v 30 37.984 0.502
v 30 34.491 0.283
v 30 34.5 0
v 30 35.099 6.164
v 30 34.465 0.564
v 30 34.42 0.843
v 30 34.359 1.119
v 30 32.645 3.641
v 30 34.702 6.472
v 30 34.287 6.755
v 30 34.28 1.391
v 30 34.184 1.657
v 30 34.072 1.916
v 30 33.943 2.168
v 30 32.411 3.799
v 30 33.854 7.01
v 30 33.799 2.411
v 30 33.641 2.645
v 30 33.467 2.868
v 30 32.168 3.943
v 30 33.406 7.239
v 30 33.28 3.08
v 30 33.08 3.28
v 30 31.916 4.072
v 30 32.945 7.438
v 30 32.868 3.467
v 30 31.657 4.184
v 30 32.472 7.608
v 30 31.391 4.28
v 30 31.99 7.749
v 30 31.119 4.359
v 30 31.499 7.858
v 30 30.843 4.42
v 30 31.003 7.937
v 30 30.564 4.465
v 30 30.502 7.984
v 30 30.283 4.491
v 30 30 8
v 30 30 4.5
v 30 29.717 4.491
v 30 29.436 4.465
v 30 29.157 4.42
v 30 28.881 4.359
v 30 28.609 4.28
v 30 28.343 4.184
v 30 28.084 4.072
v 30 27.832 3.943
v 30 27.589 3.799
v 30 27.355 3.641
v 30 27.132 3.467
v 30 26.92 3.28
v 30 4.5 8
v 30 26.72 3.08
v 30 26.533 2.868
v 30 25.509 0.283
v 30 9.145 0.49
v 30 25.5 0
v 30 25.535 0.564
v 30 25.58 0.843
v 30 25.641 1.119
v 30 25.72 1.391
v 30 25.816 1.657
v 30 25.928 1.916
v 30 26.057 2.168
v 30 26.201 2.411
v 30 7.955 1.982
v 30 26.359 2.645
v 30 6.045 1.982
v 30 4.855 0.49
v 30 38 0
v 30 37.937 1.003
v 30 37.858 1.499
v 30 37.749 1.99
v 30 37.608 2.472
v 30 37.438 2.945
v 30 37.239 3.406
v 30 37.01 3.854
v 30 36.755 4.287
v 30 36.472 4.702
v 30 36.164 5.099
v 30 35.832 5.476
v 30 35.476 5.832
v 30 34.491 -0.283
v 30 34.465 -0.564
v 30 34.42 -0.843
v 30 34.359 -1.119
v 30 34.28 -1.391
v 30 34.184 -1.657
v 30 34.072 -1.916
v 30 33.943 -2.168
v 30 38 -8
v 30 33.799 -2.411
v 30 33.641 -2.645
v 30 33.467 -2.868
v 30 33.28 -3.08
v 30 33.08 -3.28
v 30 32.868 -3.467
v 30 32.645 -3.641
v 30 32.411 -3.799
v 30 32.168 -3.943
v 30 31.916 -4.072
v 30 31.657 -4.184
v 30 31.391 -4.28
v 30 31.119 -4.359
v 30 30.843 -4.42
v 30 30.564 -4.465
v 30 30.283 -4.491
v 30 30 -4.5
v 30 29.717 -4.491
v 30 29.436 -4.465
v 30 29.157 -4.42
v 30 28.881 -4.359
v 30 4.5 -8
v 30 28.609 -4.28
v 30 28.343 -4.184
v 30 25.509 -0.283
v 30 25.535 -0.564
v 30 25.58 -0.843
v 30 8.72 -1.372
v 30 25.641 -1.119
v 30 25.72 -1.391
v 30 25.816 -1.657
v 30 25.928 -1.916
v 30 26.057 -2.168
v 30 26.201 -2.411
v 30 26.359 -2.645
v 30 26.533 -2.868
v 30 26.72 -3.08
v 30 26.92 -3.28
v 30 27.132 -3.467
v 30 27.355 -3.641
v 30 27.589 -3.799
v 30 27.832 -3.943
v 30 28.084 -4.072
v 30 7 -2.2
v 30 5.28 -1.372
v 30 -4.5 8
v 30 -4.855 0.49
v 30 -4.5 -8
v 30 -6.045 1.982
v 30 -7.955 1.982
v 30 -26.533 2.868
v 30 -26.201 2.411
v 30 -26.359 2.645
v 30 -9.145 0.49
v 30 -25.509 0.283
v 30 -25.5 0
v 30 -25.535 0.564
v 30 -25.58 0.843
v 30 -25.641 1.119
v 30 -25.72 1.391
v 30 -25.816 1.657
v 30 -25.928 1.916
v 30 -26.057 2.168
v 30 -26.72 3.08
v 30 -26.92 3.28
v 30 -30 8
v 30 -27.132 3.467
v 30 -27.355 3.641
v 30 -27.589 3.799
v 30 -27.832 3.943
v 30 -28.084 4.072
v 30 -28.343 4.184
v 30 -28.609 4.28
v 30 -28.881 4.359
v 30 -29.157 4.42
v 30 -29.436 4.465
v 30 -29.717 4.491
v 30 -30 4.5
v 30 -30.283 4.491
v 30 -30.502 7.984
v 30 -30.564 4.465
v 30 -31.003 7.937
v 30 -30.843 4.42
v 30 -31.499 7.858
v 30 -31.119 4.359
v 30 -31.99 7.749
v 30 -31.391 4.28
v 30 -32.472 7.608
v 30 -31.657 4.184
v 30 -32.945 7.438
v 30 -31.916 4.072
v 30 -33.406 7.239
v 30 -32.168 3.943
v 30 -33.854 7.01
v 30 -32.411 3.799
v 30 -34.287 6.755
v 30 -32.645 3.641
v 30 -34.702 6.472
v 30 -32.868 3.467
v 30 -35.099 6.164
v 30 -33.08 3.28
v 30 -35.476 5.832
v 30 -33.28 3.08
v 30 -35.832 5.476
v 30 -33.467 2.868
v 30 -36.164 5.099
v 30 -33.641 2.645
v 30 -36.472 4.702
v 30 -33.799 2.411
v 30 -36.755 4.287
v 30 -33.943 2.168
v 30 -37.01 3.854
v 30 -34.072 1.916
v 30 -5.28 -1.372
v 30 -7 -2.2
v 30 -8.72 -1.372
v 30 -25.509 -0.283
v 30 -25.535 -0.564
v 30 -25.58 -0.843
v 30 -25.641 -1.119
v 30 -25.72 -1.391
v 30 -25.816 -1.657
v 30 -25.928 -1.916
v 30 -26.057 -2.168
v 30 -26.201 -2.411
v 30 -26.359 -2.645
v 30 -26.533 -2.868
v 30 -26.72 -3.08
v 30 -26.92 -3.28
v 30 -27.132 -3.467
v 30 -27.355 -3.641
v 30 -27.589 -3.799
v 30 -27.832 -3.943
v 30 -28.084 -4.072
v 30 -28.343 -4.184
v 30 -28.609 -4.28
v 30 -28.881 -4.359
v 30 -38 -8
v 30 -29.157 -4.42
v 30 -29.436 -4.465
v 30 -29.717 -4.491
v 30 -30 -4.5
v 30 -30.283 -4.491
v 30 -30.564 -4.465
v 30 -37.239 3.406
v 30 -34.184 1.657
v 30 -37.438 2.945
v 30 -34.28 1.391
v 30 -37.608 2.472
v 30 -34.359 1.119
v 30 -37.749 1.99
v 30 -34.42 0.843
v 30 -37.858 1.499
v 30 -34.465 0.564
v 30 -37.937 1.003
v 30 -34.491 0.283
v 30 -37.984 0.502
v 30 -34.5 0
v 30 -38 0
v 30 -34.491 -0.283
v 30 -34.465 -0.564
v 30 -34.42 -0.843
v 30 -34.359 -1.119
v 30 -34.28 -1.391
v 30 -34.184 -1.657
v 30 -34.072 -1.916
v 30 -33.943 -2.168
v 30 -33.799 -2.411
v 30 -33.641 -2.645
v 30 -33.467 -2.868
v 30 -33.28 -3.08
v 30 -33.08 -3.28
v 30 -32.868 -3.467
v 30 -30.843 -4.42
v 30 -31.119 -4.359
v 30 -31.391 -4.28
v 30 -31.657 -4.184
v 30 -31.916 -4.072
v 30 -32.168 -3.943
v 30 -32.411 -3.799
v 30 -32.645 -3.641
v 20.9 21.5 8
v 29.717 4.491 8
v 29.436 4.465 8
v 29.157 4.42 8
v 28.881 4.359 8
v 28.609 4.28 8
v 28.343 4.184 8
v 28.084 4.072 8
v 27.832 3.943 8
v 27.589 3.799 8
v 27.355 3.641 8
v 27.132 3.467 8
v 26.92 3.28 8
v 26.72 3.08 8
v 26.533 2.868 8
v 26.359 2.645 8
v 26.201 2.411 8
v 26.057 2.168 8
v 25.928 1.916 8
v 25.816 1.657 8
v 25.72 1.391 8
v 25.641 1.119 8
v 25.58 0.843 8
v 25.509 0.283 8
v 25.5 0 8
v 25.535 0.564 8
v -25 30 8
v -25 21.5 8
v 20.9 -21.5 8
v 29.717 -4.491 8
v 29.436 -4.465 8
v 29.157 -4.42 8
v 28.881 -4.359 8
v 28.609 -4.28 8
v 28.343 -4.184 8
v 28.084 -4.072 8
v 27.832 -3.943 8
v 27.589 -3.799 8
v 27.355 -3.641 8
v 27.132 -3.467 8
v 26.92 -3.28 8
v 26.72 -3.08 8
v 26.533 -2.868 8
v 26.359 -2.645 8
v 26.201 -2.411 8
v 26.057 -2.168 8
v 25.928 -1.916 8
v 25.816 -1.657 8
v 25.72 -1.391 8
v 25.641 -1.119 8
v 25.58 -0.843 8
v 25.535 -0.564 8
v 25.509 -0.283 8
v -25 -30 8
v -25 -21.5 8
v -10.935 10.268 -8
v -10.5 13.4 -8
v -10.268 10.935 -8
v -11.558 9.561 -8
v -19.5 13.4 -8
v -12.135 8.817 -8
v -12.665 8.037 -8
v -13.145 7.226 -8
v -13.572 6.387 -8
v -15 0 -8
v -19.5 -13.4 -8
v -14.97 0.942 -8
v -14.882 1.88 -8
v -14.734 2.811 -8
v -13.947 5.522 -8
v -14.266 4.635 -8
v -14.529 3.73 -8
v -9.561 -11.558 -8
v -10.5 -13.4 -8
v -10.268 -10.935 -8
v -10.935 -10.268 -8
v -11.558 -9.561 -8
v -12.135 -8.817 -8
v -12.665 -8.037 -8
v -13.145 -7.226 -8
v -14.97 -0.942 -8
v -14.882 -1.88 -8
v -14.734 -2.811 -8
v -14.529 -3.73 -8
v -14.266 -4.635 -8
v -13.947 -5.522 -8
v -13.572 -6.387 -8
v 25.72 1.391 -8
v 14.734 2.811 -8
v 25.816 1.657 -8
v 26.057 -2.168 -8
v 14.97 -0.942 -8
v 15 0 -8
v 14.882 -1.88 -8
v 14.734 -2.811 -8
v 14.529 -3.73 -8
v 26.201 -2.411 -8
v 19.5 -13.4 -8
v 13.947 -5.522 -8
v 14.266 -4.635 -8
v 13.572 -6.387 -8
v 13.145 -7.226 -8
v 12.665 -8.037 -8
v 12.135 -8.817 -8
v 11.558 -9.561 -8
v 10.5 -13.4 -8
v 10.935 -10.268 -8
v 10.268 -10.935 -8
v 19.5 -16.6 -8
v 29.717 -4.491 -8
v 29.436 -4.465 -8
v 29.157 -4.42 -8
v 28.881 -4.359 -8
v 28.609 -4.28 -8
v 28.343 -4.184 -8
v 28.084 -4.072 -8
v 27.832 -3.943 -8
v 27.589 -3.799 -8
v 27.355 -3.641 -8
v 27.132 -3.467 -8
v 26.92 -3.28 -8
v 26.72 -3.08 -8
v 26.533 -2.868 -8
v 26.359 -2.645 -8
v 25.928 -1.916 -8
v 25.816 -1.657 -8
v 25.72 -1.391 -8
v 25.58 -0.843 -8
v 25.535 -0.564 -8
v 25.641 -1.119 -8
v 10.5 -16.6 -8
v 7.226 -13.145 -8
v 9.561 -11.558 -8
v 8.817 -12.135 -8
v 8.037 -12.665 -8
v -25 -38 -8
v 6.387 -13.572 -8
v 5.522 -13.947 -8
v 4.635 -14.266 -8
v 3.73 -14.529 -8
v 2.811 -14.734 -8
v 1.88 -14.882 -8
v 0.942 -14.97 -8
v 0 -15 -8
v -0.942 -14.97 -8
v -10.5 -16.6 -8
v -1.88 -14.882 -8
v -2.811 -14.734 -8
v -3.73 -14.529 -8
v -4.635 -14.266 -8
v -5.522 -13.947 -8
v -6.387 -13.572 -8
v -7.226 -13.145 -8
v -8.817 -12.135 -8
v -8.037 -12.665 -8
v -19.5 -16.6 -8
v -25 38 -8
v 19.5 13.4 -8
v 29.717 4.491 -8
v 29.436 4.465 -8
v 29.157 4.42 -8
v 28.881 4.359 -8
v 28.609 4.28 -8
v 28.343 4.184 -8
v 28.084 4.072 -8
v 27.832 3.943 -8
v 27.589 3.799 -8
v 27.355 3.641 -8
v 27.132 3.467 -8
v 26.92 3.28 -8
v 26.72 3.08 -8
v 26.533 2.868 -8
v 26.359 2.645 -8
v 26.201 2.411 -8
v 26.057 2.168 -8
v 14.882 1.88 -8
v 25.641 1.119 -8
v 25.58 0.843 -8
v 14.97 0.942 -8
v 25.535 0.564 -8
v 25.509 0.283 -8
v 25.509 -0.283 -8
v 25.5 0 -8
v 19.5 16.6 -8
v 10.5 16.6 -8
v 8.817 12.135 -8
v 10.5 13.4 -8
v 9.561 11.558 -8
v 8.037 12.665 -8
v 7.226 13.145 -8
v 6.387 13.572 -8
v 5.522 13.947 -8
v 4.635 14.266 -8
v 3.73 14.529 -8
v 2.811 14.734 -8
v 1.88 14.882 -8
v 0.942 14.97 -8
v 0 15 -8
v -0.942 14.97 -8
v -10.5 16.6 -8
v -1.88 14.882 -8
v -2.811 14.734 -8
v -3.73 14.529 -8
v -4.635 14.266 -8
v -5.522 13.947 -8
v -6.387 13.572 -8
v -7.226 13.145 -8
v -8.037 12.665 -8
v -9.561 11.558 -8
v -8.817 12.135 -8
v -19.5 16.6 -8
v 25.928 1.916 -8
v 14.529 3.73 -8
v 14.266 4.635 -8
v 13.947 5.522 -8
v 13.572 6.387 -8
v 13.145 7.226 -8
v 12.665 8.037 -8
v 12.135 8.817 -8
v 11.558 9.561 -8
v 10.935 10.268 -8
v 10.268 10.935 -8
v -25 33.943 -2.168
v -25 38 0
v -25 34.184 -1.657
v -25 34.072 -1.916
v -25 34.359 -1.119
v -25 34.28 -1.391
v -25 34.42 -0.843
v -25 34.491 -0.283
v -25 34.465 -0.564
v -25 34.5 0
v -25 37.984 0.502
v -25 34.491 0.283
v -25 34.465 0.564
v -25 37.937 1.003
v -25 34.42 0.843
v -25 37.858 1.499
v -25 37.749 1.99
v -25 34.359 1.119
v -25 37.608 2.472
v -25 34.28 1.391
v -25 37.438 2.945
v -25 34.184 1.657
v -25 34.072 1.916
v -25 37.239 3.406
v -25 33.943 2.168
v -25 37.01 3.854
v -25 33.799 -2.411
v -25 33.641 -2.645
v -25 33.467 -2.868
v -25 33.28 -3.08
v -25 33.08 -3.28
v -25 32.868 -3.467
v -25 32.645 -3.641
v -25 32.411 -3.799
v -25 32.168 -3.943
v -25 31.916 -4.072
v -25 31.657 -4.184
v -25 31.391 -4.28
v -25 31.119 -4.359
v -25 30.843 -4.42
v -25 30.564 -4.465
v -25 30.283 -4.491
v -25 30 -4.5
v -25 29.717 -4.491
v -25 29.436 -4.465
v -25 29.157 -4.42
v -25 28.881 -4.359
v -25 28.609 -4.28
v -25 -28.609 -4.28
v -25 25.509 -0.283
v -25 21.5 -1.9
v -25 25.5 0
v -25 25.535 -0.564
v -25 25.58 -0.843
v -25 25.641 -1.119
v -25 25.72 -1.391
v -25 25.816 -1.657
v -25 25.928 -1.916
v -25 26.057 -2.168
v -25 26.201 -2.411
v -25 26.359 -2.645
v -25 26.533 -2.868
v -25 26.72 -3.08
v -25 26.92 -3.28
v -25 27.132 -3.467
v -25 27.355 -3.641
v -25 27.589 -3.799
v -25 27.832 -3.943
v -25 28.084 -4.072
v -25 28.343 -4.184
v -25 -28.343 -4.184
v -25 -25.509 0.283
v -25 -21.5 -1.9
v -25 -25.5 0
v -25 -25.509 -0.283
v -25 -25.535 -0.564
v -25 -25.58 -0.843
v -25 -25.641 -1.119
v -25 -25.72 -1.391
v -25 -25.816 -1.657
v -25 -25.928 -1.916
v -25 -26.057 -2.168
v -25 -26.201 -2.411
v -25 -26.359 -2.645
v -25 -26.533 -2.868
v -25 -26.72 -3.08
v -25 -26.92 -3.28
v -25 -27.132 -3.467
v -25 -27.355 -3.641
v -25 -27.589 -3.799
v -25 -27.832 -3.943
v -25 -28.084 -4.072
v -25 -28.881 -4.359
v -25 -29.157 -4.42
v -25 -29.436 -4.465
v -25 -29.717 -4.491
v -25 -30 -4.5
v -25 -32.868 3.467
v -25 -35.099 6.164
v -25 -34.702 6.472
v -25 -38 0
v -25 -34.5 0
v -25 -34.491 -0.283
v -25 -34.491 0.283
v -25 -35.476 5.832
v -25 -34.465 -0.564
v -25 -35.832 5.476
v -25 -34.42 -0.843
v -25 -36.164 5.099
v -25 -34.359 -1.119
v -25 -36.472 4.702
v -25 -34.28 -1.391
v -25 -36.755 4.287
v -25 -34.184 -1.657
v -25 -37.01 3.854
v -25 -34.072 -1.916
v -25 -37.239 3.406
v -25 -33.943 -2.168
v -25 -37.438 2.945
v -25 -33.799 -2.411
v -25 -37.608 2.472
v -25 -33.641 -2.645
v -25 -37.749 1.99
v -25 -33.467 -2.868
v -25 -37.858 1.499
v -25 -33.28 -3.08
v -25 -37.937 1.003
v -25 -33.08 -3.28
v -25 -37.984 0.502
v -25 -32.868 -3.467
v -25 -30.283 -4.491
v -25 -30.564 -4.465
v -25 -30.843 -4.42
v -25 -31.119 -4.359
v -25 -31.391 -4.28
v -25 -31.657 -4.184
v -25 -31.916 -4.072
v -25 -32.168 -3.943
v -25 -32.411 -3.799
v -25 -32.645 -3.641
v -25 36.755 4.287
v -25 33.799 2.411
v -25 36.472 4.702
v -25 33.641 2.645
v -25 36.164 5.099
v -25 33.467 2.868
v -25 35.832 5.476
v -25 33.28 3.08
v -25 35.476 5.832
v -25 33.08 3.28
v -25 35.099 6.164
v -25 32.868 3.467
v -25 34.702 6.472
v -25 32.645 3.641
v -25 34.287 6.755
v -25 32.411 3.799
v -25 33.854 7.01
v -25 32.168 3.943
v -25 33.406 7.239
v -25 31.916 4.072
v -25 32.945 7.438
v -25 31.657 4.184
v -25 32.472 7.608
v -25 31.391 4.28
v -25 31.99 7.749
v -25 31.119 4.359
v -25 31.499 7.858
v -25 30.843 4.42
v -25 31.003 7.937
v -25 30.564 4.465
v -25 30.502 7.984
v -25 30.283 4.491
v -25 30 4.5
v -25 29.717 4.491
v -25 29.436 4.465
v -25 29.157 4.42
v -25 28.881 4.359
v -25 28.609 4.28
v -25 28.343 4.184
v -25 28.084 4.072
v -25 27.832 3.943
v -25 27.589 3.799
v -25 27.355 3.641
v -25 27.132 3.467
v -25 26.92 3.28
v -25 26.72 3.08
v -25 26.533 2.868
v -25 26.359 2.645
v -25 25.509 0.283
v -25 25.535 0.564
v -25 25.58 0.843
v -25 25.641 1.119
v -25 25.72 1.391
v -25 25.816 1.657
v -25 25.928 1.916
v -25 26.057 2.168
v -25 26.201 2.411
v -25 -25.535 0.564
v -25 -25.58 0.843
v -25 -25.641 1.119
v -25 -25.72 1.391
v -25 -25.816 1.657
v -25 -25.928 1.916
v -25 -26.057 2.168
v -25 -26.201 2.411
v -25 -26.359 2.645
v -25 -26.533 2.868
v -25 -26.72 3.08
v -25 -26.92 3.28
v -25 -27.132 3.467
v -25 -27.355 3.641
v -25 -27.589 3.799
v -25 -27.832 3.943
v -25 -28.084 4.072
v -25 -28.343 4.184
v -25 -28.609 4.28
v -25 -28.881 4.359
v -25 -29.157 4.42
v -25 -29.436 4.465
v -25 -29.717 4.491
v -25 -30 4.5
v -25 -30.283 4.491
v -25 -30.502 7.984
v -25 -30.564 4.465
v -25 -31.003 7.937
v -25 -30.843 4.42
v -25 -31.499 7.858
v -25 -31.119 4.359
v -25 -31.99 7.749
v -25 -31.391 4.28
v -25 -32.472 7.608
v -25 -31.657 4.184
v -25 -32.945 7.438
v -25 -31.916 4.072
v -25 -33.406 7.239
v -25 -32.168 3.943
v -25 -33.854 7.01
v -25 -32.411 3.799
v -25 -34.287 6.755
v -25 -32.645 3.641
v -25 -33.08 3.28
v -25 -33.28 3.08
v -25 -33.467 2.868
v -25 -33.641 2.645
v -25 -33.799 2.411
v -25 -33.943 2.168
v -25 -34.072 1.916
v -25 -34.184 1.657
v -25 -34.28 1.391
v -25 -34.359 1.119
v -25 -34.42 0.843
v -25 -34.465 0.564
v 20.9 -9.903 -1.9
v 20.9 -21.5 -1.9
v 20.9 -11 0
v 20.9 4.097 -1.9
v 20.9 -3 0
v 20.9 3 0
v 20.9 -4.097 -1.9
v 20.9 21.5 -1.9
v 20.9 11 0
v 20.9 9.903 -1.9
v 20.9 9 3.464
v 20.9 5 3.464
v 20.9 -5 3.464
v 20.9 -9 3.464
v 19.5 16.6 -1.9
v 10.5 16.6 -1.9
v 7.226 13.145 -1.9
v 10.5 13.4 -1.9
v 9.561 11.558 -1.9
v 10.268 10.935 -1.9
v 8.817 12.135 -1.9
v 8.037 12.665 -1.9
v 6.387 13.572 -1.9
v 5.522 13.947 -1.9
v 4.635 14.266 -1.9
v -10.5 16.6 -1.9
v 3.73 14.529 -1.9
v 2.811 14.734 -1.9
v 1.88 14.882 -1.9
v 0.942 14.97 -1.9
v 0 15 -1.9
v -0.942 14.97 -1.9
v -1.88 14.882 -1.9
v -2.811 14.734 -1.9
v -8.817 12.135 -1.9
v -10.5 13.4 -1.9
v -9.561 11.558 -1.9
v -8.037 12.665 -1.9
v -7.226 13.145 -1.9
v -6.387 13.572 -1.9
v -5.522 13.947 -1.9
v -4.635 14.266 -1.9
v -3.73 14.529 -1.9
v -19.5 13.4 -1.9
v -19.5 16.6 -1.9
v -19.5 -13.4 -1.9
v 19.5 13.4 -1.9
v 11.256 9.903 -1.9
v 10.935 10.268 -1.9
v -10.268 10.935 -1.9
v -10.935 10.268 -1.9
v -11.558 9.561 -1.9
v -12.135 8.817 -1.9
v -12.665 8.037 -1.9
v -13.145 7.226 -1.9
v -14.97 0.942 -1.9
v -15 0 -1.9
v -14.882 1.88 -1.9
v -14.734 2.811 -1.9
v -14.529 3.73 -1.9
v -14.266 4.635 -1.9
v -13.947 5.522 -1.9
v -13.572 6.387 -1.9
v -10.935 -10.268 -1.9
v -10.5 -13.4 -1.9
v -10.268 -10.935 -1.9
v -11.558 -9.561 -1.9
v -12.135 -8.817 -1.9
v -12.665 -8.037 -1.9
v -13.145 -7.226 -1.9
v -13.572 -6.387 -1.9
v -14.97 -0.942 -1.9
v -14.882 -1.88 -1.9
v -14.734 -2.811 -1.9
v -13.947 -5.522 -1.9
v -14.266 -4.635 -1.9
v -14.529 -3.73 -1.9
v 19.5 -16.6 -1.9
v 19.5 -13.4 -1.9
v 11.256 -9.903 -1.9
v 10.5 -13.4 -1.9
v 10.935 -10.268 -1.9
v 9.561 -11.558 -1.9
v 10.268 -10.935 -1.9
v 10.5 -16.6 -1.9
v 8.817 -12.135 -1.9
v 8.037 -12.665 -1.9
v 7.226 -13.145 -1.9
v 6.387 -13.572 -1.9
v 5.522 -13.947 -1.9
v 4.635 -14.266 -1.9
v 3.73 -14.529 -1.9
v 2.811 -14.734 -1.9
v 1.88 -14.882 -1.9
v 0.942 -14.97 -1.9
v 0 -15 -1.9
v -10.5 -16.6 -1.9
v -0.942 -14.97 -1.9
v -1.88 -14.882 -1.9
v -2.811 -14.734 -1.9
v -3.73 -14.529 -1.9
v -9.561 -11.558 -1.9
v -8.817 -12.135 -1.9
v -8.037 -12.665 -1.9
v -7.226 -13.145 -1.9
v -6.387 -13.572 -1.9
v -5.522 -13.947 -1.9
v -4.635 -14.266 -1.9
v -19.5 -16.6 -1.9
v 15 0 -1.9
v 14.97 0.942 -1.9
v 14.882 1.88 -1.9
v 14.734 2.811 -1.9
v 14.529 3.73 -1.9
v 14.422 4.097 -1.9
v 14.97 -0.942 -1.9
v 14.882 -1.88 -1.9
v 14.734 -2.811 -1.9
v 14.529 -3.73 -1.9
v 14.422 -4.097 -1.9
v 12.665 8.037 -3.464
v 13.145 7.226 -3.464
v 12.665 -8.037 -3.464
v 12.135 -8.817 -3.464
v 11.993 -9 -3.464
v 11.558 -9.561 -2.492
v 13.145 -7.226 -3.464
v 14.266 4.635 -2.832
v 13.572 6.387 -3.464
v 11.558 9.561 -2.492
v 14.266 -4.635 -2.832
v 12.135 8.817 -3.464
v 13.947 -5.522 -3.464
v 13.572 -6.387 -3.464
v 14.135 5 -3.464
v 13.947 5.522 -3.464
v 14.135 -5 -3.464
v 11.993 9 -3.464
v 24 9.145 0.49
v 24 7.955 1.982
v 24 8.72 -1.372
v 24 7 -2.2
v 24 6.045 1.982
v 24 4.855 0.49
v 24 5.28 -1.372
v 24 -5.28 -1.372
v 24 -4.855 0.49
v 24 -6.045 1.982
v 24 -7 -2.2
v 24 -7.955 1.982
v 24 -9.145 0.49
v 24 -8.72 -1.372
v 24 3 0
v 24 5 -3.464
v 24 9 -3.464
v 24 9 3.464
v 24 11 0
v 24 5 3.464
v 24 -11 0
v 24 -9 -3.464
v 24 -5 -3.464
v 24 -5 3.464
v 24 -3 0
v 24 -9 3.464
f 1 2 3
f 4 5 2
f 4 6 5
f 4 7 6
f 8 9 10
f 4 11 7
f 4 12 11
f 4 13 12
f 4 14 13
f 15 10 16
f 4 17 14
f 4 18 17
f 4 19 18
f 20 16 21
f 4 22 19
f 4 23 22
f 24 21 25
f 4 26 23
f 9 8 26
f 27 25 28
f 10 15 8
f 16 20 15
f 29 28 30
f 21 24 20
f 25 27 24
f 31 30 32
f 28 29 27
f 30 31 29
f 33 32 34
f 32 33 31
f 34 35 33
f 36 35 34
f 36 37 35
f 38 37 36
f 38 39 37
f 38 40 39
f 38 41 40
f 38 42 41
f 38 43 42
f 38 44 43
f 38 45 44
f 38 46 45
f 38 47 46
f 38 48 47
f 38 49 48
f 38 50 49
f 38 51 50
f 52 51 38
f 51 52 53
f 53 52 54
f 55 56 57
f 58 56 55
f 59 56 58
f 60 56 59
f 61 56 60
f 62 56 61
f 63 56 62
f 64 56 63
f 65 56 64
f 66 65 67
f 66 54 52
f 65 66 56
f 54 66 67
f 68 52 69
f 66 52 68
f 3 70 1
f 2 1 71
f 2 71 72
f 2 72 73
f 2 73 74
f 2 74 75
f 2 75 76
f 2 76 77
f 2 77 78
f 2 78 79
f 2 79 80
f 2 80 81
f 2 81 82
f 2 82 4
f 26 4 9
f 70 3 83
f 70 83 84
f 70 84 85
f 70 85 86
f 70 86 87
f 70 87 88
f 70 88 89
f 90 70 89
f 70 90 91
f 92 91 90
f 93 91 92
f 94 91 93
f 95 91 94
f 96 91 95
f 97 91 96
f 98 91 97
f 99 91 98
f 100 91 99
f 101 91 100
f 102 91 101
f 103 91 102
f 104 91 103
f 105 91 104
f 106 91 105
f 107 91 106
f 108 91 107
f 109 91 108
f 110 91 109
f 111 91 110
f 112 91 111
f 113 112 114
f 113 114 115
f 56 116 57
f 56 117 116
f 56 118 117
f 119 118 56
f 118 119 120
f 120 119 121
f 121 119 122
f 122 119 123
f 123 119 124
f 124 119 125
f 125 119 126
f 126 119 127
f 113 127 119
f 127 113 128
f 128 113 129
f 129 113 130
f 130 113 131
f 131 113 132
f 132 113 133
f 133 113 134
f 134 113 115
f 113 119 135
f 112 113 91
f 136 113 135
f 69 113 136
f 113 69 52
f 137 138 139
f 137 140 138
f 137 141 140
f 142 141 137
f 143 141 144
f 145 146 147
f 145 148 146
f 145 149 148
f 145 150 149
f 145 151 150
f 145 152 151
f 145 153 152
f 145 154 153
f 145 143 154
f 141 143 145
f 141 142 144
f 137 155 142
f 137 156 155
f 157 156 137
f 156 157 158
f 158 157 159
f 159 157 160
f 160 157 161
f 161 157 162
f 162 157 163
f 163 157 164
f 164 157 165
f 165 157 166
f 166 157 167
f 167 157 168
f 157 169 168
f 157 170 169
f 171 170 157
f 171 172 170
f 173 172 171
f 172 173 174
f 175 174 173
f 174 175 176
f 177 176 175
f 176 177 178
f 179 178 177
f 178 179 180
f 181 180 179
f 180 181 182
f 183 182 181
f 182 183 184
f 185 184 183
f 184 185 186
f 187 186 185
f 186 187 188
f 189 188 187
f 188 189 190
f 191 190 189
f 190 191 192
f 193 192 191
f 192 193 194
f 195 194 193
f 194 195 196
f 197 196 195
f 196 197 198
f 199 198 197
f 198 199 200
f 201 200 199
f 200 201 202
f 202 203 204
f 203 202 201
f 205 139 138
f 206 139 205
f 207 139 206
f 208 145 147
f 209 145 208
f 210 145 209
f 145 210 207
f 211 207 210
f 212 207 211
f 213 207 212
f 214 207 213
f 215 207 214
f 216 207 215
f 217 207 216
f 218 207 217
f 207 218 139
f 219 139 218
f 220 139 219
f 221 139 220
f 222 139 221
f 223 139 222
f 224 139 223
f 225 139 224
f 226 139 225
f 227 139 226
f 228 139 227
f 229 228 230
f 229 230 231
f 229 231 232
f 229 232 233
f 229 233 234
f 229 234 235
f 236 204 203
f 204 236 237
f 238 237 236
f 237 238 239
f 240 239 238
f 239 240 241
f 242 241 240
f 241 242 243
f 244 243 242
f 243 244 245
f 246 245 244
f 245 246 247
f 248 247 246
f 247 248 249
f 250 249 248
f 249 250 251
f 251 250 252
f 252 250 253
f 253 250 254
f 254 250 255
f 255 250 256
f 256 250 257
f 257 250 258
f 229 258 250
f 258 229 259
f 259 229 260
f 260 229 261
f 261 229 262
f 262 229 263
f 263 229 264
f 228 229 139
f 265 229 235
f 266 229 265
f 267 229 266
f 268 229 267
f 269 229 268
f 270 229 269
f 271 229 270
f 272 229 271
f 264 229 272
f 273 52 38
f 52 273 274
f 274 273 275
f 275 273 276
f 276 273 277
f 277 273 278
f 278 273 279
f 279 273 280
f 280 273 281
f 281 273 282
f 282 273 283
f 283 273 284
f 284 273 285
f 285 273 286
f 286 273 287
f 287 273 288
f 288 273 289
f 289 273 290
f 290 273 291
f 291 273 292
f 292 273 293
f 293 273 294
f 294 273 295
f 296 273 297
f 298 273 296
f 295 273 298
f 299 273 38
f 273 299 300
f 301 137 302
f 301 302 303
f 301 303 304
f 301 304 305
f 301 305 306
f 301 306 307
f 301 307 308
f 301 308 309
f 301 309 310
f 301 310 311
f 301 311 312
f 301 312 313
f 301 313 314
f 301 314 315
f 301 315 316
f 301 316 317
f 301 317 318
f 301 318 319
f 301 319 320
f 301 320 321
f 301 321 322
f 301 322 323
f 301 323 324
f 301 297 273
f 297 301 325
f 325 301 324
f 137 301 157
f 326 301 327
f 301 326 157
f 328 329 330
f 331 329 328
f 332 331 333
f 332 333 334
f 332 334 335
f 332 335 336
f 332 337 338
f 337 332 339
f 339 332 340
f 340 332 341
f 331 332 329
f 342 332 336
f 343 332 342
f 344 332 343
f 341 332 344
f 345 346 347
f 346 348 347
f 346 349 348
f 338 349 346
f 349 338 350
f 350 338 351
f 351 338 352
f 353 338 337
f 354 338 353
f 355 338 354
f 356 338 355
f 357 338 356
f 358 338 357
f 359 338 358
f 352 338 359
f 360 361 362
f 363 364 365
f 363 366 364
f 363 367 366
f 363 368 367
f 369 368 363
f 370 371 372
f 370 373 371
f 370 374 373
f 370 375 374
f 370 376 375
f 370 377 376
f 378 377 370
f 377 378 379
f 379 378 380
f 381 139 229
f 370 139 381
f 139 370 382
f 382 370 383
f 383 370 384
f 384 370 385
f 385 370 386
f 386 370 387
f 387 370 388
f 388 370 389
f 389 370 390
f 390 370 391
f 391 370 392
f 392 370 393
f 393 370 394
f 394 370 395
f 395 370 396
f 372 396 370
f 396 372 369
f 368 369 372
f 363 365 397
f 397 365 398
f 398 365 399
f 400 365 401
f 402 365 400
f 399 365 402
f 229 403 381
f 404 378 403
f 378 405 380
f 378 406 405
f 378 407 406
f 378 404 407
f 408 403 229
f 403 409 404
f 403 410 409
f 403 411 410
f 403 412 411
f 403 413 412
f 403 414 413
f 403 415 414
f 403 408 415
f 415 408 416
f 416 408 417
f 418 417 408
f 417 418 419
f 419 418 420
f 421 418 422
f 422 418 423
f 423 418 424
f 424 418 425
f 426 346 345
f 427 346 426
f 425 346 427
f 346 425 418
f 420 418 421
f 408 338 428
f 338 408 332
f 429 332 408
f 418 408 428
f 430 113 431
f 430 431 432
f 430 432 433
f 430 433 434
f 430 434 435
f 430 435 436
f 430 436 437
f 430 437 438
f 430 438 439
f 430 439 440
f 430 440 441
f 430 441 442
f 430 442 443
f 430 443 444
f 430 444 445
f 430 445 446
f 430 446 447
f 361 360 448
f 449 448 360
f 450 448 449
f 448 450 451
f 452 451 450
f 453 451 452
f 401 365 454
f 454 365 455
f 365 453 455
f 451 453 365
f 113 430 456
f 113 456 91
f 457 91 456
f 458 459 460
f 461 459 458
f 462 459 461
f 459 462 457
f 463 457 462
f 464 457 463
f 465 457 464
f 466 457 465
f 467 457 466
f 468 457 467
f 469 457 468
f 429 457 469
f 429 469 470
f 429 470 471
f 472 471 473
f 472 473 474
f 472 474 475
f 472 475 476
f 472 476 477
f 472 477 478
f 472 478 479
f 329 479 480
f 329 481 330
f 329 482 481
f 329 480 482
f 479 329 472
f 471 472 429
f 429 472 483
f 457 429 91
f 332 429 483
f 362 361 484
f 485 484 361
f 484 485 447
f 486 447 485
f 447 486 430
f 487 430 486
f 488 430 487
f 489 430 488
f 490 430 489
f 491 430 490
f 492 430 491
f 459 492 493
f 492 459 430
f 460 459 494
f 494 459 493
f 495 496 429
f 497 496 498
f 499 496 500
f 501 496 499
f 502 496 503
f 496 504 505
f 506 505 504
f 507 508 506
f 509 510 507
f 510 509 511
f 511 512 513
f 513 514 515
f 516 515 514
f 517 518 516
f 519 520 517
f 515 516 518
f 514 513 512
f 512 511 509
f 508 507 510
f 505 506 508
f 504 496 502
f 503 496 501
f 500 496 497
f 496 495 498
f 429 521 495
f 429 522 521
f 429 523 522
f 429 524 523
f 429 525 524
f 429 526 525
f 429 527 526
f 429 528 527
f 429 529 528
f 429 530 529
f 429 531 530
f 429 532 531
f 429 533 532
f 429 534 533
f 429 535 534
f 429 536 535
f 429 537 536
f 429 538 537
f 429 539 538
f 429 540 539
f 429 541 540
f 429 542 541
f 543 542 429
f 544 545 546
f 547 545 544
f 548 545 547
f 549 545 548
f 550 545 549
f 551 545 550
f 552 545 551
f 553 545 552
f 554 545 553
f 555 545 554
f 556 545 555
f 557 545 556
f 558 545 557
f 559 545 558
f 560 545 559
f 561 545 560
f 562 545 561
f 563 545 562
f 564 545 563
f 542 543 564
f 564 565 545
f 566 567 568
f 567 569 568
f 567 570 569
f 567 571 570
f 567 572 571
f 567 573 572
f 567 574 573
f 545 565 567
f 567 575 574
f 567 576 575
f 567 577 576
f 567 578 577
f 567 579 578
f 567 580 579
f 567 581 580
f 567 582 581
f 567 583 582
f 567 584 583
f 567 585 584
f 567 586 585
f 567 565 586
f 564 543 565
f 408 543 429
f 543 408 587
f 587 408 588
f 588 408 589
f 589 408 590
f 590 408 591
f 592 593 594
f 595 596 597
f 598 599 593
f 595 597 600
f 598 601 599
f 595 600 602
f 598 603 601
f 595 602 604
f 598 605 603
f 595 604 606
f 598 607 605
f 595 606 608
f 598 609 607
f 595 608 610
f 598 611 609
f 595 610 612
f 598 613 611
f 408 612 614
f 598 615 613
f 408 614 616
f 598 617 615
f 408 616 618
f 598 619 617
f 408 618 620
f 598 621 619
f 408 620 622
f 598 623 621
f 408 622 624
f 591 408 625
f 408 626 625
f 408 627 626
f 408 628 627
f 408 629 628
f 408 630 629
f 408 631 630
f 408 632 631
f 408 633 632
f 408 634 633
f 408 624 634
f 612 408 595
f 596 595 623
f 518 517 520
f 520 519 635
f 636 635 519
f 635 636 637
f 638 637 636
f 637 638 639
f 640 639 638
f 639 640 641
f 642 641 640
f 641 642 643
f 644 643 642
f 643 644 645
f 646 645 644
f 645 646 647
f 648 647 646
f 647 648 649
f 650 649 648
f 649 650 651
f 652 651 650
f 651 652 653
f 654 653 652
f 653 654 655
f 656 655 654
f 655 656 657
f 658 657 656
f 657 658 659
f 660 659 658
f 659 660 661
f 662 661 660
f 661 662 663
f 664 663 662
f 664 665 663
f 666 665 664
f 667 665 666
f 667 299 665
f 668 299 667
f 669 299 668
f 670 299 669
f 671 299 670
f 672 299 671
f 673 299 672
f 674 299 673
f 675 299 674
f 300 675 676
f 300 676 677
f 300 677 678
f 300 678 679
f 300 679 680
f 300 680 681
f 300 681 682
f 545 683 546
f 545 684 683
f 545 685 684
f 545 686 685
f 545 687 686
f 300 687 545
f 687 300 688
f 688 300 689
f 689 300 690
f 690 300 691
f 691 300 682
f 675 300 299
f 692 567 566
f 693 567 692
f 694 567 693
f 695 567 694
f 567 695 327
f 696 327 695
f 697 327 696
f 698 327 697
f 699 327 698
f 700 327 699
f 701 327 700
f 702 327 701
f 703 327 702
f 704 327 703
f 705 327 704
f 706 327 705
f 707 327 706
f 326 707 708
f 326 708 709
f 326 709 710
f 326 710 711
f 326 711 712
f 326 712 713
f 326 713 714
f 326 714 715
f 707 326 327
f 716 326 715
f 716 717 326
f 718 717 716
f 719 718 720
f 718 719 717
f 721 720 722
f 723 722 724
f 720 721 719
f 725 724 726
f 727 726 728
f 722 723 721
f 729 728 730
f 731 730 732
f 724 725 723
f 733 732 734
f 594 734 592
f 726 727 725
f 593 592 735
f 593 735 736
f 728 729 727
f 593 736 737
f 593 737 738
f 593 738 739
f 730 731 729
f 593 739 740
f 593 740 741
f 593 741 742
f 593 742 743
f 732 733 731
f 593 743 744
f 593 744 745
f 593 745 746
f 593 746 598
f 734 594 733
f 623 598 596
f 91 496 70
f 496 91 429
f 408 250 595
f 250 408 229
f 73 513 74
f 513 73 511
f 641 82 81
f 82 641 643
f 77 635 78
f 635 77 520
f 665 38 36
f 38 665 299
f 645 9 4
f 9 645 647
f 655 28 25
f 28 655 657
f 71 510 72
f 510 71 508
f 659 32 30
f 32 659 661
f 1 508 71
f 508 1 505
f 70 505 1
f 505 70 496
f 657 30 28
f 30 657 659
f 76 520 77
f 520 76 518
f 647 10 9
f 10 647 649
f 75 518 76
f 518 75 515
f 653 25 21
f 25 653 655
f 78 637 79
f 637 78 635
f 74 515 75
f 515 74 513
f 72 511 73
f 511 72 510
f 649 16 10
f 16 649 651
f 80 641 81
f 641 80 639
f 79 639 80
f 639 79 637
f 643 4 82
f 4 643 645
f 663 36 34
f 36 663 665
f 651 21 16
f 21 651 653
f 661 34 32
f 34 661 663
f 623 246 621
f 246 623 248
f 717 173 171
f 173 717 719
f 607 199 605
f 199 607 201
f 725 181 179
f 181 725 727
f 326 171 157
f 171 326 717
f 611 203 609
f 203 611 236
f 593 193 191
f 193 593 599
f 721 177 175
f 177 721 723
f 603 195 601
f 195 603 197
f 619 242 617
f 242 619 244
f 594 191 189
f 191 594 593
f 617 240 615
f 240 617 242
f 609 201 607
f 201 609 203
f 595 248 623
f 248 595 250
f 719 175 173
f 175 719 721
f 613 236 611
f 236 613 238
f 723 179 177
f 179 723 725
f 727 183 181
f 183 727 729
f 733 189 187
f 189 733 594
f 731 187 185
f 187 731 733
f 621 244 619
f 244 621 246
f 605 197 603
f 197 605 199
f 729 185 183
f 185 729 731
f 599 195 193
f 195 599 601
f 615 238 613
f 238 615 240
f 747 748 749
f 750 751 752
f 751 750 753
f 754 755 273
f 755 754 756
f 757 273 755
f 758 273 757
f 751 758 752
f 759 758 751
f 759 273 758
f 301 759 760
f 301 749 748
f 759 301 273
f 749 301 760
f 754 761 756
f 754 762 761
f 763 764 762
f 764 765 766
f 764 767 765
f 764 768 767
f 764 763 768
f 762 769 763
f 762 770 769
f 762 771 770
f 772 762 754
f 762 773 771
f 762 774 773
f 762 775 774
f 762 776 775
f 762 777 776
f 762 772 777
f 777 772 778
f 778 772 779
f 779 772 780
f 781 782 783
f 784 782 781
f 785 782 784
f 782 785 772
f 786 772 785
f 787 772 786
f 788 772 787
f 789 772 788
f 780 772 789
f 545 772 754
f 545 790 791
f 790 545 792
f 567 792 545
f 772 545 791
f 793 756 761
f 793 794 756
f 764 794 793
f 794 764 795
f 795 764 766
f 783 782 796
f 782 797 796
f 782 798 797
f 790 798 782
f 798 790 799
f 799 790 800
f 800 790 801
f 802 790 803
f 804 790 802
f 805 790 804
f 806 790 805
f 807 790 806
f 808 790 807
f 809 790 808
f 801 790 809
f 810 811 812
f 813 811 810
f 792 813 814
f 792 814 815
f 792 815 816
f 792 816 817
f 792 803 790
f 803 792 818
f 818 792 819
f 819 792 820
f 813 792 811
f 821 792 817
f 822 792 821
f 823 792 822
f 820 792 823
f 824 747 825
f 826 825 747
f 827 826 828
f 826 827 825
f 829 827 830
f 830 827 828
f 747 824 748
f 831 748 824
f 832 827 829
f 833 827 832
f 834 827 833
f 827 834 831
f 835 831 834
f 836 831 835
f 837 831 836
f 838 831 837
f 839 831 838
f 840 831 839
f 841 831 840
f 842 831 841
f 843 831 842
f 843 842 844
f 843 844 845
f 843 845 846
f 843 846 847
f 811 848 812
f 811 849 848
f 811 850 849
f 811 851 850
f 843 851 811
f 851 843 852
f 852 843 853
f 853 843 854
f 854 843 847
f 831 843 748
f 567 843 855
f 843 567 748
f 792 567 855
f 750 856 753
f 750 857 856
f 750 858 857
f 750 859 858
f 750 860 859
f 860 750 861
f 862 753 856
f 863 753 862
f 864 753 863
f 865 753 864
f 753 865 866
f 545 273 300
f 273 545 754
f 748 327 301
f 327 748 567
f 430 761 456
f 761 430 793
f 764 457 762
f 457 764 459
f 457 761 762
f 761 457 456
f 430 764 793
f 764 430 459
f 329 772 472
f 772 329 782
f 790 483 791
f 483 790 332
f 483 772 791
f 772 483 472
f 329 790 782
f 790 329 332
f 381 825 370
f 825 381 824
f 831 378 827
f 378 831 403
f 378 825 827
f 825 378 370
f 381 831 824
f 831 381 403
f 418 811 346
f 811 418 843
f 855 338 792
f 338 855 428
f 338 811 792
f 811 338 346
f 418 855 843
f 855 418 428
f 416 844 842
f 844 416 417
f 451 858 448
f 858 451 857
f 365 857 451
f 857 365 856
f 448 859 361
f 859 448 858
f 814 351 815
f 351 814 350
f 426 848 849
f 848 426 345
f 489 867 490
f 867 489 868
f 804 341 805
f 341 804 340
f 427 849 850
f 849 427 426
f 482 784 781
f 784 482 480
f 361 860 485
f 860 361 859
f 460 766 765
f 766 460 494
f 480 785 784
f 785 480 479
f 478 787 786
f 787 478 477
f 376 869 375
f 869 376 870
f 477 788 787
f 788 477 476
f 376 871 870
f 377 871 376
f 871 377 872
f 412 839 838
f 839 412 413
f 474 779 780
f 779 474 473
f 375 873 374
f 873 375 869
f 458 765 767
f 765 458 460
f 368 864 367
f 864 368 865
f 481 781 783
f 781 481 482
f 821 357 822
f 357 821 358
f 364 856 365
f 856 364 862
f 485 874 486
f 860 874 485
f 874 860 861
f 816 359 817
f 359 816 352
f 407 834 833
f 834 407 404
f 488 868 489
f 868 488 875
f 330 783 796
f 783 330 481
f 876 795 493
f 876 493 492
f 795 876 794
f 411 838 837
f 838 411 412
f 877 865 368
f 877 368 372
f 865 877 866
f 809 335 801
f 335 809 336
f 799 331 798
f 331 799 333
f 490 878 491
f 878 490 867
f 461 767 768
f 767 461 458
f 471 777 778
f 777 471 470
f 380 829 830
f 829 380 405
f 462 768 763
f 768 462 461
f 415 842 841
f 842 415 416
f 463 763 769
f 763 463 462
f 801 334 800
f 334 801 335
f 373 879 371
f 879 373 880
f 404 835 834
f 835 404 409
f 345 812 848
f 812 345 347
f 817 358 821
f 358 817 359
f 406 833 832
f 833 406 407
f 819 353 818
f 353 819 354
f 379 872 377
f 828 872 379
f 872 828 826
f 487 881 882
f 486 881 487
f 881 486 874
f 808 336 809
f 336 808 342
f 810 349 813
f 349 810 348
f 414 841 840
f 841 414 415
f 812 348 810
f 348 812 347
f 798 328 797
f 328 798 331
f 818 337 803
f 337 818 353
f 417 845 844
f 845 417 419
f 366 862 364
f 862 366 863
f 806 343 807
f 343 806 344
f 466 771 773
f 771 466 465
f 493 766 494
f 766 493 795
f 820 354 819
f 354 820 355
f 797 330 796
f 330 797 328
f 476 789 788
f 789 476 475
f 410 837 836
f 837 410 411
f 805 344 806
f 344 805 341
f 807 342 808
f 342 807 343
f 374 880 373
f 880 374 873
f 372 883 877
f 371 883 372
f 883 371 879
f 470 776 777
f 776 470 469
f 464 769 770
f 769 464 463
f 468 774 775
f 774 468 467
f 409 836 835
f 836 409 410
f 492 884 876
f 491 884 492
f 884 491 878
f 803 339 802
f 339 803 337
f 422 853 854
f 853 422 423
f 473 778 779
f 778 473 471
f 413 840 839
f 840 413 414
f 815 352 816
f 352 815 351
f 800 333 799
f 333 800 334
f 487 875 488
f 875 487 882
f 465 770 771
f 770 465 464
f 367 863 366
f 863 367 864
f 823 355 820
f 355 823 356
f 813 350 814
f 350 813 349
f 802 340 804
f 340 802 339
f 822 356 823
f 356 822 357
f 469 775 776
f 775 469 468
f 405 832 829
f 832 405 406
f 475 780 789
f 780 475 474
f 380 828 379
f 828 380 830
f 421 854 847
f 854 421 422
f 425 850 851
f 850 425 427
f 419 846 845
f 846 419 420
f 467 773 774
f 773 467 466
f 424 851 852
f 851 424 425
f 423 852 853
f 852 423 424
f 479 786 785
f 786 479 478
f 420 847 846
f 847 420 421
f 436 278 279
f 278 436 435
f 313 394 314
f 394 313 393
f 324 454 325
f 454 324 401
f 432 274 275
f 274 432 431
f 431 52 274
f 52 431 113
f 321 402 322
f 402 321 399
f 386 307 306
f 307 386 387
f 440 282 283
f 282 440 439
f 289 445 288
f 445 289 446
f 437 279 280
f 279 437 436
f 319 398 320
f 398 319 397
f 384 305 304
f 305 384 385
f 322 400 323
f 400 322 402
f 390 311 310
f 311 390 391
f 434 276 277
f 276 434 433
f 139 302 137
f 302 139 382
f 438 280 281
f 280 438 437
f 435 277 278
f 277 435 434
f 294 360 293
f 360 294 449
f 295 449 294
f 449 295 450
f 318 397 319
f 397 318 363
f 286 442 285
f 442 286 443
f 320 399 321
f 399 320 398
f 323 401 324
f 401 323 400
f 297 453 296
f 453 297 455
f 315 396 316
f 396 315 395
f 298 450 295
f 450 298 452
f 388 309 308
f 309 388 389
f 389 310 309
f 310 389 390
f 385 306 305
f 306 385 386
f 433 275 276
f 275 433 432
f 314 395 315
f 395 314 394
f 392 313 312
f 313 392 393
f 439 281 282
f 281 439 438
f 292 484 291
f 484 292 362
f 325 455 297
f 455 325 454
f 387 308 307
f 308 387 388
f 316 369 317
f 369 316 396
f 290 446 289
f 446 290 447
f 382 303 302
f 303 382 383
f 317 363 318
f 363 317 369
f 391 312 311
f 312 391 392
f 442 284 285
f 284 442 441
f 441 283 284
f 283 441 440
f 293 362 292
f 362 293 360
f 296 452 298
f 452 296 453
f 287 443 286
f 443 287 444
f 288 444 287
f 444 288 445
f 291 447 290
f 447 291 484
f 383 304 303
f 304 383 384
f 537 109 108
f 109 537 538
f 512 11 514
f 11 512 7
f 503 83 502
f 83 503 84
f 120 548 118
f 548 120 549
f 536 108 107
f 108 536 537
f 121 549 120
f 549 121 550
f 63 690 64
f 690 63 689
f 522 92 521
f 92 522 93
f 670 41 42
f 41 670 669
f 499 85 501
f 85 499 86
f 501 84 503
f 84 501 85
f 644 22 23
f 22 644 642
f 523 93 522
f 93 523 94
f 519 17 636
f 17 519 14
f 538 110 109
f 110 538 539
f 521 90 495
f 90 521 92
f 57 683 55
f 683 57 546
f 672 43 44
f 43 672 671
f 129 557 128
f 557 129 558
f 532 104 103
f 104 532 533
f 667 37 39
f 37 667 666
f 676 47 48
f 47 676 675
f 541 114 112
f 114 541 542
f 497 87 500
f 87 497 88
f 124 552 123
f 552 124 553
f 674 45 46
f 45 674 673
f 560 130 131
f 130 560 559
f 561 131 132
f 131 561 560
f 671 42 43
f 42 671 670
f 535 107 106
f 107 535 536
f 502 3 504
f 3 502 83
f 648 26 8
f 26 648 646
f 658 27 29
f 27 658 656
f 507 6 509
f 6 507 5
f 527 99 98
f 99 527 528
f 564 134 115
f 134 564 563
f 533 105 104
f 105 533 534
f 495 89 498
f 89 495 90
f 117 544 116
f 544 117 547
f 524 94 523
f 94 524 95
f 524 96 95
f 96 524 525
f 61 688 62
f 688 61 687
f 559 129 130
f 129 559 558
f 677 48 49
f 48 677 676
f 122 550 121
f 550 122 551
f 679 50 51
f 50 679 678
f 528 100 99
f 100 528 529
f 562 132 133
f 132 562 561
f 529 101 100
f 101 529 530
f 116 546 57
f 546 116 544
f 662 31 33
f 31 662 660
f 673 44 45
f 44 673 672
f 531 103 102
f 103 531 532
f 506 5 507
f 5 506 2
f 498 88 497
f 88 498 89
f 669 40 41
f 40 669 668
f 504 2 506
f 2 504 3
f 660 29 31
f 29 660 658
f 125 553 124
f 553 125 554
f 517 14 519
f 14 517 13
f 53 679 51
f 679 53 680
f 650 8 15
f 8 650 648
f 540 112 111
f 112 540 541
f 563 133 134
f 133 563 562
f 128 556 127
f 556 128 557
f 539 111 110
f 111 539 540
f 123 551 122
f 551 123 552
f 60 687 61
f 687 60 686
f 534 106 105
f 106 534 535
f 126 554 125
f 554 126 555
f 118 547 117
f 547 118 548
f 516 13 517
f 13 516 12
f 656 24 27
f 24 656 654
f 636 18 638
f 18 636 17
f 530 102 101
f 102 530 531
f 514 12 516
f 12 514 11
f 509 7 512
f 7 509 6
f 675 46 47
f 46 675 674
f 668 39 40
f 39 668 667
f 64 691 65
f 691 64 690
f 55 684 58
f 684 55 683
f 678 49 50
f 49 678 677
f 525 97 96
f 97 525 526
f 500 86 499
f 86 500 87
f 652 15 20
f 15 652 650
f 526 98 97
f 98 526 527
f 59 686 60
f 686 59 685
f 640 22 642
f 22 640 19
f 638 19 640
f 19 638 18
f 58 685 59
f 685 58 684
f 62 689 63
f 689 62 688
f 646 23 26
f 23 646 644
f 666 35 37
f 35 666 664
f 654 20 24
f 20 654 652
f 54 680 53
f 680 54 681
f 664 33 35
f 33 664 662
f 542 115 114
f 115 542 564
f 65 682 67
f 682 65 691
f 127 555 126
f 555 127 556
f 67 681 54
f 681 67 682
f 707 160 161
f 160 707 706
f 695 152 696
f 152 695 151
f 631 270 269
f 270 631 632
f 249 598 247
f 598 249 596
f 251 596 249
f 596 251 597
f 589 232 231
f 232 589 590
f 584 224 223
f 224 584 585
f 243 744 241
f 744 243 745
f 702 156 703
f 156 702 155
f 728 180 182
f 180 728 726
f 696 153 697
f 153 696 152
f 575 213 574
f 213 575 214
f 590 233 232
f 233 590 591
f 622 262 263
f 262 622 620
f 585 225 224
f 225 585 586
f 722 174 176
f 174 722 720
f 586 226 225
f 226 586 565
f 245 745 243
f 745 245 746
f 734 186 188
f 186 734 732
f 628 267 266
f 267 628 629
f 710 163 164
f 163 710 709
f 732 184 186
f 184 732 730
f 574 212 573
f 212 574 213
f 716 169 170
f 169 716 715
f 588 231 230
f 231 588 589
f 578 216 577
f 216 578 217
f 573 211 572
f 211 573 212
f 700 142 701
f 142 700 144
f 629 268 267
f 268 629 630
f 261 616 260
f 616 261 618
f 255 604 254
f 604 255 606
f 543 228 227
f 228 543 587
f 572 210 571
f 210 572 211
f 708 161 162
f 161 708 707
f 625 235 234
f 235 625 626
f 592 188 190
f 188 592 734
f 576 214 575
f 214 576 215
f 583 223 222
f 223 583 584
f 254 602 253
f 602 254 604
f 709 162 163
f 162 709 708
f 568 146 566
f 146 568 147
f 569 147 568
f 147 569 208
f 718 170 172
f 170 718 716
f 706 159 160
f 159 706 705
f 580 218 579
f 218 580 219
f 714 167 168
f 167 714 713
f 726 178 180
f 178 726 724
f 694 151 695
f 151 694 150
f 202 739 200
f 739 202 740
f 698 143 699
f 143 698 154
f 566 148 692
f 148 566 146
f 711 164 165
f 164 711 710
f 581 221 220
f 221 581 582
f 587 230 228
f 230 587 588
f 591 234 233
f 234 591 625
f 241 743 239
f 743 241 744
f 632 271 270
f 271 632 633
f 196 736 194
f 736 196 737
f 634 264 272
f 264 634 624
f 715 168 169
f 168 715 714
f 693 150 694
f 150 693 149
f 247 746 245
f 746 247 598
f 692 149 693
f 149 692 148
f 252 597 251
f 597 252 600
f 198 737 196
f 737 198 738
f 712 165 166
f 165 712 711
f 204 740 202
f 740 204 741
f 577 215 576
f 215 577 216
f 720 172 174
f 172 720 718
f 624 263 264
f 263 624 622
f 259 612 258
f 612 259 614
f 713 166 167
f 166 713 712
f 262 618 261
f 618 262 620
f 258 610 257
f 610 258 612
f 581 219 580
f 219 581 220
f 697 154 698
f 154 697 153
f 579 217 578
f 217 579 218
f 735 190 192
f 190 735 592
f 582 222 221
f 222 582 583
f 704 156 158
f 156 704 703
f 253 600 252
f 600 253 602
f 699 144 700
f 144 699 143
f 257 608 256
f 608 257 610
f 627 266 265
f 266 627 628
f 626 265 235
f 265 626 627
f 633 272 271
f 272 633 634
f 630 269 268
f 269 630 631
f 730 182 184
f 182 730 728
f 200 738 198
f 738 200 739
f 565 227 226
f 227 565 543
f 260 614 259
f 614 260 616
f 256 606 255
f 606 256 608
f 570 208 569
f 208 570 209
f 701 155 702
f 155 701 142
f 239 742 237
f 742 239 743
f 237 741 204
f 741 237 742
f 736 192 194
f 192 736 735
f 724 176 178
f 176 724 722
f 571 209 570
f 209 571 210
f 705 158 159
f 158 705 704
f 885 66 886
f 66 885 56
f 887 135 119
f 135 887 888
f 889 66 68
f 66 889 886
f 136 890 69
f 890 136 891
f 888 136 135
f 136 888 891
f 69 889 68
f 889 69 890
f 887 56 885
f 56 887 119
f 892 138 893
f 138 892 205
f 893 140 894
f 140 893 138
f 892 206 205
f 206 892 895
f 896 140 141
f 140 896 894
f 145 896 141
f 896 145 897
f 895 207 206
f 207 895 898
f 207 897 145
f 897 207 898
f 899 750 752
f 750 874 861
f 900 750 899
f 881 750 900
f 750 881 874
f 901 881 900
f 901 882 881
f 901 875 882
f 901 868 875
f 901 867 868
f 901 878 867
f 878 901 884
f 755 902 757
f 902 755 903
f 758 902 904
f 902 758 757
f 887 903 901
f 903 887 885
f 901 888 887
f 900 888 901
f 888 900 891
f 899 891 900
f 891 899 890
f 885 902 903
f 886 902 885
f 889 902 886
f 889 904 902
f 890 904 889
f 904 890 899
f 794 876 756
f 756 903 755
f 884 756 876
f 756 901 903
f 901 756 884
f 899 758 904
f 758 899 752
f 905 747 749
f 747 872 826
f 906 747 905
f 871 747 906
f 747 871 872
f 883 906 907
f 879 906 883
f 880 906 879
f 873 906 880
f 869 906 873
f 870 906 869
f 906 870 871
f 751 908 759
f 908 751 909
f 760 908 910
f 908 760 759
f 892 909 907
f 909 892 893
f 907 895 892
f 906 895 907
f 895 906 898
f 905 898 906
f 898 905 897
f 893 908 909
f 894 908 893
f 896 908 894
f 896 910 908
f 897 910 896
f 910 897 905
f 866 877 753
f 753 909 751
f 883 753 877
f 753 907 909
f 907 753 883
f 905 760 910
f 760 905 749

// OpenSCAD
// file: configuration.scad
// PRUSA Mendel
// Configuration file
// GNU GPL v2
// Josef Pruša
// josefprusa@me.com
// prusadjs.cz
// http://www.reprap.org/wiki/Prusa_Mendel
// http://github.com/prusajr/PrusaMendel
// M8 rod diameter
m8_diameter = 9;
// M8 nut diameter diameter
// Used for $fn nut trick -> cylinder(h = 5, r=4.5, $fn=6, center=true);
m8_nut_diameter = 16;
// M4 rod/screw diameter
m4_diameter = 5.5;
// M4 nut diameter diameter
// Used for $fn nut trick -> cylinder(h = 5, r=4.5, $fn=6, center=true);
m4_nut_diameter = 10;
// M3 rod/screw diameter
m3_diameter = 5.5;
// M3 nut diameter diameter
// Used for $fn nut trick -> cylinder(h = 5, r=4.5, $fn=6, center=true);
m3_nut_diameter = 10;
// Bushing holders diameter
bushing_diameter = 11.5;
//Does your Machine Have Support Material?
has_support = false;
// main file
// PRUSA Mendel  
// Z motor mount
// Used for mounting Z motors
// GNU GPL v2
// Josef Průša
// josefprusa@me.com
// prusadjs.cz
// http://www.reprap.org/wiki/Prusa_Mendel
// http://github.com/prusajr/PrusaMendel

include <configuration.scad> 

module zmotormount(){
difference(){
union(){
translate(v=[2.5,0,0]) cube(size = [55,60,16], center = true);
translate(v=[2.5,0,-4]) cube(size = [55,76,8], center = true);
translate(v=[-25,30,0]) rotate(a=[0,90,0]) cylinder(h = 55, r=8, $fn=100);
translate(v=[-25,-30,0]) rotate(a=[0,90,0]) cylinder(h = 55, r=8, $fn=100);
}
translate(v=[-2.1,0,3.1]) cube(size = [46,43,10], center = true);
translate(v=[15,15,0]) cube(size = [9,3.2,25], center = true);
translate(v=[-15,15,0]) cube(size = [9,3.2,25], center = true);
translate(v=[15,-15,0]) cube(size = [9,3.2,25], center = true);
translate(v=[-15,-15,0]) cube(size = [9,3.2,25], center = true);
translate(v=[0,0,-20])cylinder(h = 100, r=15, $fn=100);
translate(v=[30,0,-20]) cylinder(h = 100, r=m8_diameter/2, $fn=100);
translate(v=[-50,30,0]) rotate(a=[0,90,0]) cylinder(h = 100, r= m8_diameter/2, $fn=100);
translate(v=[-50,-30,0]) rotate(a=[0,90,0]) cylinder(h = 100, r=m8_diameter/2, $fn=100);


translate(v=[0,7,0]) rotate(a=[0,90,0]) cylinder(h = 100, r=2.2);
translate(v=[0,-7,0]) rotate(a=[0,90,0]) cylinder(h = 100, r=2.2);
translate(v=[0,7,0]) rotate(a=[0,90,0]) rotate(a=[0,0,30]) cylinder(h = 24, r=4,$fn =6);
translate(v=[0,-7,0]) rotate(a=[0,90,0]) rotate(a=[0,0,30]) cylinder(h = 24, r=4, $fn=6);

}
}
zmotormount();
